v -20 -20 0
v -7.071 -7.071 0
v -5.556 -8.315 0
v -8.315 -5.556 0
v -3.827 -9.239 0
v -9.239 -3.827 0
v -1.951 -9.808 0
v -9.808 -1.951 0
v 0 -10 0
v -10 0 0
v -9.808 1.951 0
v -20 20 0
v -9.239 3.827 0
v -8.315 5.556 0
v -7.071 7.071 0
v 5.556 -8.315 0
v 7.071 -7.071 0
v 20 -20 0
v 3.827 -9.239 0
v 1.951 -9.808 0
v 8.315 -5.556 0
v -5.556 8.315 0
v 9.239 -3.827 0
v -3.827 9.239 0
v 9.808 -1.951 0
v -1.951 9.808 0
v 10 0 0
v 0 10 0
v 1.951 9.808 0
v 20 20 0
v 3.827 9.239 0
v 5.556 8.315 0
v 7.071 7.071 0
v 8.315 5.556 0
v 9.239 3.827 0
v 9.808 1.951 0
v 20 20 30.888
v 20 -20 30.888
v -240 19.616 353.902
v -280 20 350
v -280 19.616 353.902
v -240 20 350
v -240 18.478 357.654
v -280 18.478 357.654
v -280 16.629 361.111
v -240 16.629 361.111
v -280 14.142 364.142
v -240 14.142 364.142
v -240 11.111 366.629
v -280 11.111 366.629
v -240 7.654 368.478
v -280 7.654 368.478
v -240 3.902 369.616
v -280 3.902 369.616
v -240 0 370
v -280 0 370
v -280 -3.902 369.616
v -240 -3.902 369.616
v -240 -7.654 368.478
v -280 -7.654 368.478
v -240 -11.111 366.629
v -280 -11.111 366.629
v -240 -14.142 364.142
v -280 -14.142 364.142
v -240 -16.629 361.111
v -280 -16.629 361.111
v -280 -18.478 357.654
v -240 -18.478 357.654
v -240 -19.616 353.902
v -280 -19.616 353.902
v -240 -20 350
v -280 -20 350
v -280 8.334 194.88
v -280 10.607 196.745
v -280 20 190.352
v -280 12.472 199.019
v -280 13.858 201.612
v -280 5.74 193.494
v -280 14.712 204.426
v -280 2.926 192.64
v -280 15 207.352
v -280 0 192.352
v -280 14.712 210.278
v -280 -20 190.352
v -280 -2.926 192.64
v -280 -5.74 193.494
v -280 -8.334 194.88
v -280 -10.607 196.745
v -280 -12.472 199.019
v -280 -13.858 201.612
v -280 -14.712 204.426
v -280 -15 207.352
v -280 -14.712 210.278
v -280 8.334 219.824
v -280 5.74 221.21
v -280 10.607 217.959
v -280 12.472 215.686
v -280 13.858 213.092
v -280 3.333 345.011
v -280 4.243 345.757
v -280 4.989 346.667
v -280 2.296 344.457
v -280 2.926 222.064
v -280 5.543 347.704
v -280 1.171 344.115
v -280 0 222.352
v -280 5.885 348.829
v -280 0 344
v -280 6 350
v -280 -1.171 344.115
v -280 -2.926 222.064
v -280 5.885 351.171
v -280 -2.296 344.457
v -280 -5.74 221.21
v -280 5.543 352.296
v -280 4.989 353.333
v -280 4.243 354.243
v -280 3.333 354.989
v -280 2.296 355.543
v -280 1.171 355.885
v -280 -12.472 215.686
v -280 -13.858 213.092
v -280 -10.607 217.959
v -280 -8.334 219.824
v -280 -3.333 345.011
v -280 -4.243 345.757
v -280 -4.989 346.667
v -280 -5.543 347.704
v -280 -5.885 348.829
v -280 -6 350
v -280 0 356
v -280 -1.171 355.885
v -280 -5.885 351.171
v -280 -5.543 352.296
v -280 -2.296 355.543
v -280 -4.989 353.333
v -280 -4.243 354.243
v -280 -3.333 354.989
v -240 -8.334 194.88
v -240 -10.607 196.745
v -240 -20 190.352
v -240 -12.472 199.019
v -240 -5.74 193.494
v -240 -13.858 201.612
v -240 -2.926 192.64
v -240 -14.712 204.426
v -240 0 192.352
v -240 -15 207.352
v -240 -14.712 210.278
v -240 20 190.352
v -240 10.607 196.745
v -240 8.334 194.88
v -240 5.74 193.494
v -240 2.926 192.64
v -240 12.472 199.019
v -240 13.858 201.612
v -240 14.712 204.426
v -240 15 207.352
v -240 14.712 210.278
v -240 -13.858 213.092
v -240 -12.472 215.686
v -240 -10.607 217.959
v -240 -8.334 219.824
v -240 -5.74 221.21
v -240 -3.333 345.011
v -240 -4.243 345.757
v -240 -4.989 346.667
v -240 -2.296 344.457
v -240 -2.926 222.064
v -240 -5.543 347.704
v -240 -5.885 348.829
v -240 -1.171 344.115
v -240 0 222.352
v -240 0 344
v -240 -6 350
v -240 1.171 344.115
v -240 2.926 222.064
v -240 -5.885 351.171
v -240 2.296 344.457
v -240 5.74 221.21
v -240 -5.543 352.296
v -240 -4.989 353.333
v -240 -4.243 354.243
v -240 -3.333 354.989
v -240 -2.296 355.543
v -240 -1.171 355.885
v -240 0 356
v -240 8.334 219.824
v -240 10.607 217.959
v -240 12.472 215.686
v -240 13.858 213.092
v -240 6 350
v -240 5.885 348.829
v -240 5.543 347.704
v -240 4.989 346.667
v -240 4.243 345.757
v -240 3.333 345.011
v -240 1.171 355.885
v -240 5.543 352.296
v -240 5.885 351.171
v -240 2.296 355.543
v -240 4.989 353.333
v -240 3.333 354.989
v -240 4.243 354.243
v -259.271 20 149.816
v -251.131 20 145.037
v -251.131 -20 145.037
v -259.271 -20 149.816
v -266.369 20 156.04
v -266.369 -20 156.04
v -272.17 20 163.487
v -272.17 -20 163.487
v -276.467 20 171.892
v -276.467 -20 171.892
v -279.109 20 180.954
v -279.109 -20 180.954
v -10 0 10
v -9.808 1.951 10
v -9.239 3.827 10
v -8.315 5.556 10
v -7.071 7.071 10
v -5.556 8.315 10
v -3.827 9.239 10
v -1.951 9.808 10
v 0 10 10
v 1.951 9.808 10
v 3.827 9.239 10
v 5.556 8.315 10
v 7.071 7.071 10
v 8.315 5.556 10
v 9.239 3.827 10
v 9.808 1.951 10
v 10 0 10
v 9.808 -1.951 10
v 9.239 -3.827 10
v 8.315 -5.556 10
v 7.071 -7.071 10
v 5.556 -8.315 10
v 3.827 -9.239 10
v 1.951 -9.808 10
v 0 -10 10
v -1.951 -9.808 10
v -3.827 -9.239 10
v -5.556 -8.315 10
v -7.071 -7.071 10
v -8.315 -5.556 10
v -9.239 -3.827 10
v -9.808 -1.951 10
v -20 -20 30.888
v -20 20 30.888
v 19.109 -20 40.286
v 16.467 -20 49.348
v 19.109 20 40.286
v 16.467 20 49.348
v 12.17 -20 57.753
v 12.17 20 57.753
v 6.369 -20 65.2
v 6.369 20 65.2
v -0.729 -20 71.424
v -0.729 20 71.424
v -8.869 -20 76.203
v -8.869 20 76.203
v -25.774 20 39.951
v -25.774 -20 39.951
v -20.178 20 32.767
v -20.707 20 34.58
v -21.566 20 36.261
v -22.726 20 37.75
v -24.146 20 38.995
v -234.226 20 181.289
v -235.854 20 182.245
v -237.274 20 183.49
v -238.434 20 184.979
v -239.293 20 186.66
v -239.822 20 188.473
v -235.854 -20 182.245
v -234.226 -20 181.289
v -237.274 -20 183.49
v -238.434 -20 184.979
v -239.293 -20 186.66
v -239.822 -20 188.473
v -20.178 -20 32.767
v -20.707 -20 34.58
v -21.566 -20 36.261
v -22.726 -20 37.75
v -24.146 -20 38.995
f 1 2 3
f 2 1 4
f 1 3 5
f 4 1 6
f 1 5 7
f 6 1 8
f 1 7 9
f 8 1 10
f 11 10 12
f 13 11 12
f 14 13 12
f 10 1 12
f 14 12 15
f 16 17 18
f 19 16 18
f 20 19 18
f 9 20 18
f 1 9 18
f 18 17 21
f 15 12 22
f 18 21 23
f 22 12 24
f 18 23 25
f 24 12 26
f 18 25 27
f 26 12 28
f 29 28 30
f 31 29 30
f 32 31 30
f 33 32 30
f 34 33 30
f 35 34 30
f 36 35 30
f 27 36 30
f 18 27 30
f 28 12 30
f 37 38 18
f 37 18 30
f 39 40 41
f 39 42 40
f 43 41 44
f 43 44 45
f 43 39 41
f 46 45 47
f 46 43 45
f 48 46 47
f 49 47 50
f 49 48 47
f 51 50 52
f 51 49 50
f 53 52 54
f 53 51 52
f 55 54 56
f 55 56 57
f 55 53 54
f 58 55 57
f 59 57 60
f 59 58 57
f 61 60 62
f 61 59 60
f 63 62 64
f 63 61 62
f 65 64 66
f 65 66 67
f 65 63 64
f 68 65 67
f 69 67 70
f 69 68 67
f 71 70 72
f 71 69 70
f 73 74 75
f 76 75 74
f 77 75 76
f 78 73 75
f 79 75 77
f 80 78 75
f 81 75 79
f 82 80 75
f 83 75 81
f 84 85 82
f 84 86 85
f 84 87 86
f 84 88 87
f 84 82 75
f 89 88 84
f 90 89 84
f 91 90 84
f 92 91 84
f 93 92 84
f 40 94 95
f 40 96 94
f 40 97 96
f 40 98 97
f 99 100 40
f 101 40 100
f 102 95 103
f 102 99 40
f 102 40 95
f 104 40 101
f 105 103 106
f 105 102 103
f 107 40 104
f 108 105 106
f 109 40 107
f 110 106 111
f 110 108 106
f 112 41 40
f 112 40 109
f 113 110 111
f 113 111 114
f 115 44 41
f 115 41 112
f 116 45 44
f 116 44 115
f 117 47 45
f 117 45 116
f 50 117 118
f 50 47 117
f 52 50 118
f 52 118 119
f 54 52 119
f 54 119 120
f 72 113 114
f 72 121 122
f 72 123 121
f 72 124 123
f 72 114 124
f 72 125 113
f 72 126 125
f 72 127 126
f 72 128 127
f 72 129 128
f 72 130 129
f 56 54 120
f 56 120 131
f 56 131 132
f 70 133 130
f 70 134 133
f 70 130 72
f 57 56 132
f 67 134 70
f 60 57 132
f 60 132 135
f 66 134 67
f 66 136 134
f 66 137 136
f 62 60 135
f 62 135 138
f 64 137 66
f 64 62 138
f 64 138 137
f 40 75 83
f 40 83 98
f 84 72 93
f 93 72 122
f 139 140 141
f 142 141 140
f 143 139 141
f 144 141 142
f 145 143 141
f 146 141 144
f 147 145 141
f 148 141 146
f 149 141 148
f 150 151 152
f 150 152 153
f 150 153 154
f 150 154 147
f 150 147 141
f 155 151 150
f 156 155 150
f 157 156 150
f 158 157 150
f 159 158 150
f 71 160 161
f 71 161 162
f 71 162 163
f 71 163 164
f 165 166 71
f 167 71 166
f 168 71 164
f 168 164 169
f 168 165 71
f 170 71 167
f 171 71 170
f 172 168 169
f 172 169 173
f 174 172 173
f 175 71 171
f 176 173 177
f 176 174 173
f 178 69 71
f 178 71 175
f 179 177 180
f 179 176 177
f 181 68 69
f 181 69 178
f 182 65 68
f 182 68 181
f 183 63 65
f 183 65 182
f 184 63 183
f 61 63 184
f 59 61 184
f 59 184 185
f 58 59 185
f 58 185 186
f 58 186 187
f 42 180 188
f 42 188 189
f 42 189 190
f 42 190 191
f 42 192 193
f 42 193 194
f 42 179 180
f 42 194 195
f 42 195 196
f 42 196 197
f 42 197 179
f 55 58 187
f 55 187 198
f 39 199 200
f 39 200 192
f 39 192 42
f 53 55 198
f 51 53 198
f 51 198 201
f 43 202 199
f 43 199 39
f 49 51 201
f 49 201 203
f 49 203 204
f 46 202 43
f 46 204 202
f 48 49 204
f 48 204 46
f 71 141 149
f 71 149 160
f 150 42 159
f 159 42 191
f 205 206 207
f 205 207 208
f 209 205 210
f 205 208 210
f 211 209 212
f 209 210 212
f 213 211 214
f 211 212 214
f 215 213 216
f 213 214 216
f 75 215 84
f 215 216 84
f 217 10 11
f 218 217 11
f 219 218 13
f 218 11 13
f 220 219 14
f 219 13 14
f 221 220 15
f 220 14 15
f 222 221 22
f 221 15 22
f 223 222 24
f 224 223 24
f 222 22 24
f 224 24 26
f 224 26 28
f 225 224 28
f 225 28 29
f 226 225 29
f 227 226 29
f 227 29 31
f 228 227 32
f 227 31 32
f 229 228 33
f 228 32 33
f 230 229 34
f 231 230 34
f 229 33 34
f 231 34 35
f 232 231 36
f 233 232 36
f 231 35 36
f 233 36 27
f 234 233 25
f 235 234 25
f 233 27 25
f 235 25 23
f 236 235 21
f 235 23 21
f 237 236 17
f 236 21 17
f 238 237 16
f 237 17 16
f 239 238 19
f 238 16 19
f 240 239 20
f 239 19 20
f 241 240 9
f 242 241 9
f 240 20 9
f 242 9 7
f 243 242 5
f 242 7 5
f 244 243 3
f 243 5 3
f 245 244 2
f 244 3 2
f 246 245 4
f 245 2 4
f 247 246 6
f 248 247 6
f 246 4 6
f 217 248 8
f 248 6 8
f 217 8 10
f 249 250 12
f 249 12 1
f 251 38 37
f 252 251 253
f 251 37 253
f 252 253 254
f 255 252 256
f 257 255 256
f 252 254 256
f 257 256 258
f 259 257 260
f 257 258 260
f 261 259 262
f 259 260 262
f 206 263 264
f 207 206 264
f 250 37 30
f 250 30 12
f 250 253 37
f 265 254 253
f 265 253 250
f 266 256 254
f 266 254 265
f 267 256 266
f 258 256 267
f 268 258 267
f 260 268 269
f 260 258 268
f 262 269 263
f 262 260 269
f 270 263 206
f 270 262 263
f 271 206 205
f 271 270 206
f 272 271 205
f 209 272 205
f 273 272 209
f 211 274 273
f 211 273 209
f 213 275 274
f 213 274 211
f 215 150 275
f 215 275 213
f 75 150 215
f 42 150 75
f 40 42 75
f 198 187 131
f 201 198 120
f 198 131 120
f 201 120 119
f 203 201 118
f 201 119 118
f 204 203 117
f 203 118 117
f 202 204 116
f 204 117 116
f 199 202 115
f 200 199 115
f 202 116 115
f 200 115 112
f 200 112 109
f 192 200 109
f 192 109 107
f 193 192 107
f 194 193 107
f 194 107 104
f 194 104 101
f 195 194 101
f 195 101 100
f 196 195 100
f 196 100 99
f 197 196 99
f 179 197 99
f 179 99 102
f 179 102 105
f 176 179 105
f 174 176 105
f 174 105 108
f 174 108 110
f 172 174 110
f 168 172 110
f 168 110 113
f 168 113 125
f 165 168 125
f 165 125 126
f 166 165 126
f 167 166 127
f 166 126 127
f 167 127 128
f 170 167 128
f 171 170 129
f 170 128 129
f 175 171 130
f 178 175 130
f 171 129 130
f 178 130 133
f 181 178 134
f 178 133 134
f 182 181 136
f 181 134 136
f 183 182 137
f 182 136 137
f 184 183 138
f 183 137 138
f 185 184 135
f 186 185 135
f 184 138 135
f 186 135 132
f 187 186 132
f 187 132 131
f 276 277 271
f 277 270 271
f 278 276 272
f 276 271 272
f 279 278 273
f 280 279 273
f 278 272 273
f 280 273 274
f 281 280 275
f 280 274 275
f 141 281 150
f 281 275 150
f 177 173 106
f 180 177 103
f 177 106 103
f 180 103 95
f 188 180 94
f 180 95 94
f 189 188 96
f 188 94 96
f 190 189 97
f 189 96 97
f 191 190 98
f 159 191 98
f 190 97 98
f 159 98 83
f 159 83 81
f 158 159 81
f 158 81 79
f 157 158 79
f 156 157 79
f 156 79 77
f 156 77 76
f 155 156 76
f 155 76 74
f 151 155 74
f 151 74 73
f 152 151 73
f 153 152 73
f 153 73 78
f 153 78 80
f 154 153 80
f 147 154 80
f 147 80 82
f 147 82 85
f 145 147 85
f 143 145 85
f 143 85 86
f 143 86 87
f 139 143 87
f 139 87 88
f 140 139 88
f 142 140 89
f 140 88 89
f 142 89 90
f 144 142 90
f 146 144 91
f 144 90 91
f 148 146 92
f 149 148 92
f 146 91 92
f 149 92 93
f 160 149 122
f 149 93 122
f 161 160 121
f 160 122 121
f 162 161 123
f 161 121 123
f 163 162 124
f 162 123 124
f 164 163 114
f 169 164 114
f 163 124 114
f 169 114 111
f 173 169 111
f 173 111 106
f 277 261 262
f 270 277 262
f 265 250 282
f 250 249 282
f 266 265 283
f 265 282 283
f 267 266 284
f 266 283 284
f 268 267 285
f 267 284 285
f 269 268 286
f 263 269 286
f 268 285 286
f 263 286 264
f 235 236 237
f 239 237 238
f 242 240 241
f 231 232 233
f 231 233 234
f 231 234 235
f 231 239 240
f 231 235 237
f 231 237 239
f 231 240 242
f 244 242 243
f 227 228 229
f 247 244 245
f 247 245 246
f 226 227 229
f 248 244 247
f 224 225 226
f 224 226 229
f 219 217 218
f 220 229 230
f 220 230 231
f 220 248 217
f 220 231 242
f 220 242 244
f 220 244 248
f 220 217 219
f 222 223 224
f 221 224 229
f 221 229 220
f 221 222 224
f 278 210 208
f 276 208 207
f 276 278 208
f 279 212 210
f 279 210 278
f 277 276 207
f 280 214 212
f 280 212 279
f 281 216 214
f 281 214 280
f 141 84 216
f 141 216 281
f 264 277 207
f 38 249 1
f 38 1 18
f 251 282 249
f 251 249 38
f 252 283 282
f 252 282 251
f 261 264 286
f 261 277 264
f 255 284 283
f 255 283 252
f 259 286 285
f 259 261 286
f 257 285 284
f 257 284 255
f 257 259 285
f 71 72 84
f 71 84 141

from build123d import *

# Parameters (mm, degrees)
SKETCH_2_W          = 40
SKETCH_2_H          = 40
FILLET_1_RADIUS     = 20
FILLET_1_LENGTH     = 40
SKETCH_3_R          = 6
CUT_EXTRUDE_1_DEPTH = 477.759897642
SKETCH_4_R          = 10
CUT_EXTRUDE_2_DEPTH = 10
SKETCH_5_R          = 15
CUT_EXTRUDE_3_DEPTH = 477.759897642


with BuildPart() as part:
    # 扫描1: sweep along a path in 草图1
    with BuildLine(Plane(origin=(0, 0, 0), x_dir=(1, 0, 0), z_dir=(0, 1, 0))) as sweep_1_path:
        Line((0, 0), (0, -30.887892176))
        ThreePointArc((0, -30.887892176), (-4.698256626, -47.006880426), (-17.321452148, -58.077125787))
        Line((-17.321452148, -58.077125787), (-242.678547852, -163.162865333))
        ThreePointArc((-242.678547852, -163.162865333), (-255.301743374, -174.233110694), (-260, -190.352098945))
        Line((-260, -190.352098945), (-260, -370))
    # 草图2 → 扫描1 (sweep)
    with BuildSketch(Plane.XY):
        Rectangle(SKETCH_2_W, SKETCH_2_H)
    sweep(path=sweep_1_path.line)

    # 圆角1: full round fillet: the end face becomes a half cylinder, R = half its width
    fillet_1_face = Plane((-260, 0, 370), x_dir=(1, 0, 0), z_dir=(0, 0, 1))  # on the end face: x along it, z out of the body
    fillet_1_slab = fillet_1_face.offset(-FILLET_1_RADIUS / 2) * Box(FILLET_1_LENGTH, 2 * FILLET_1_RADIUS, FILLET_1_RADIUS, mode=Mode.PRIVATE)  # the body's end, R deep
    fillet_1_round = Plane((-260, 0, 350), x_dir=(0, 0, 1), z_dir=(1, 0, 0)) * Cylinder(FILLET_1_RADIUS, FILLET_1_LENGTH, mode=Mode.PRIVATE)  # its axis R under the face
    add(fillet_1_slab - fillet_1_round, mode=Mode.SUBTRACT)

    # 草图3 → 切除-拉伸1 (cut, through all)
    with BuildSketch(Plane.ZY.offset(280)):
        with Locations((350, 0)):
            Circle(SKETCH_3_R)
    extrude(amount=-CUT_EXTRUDE_1_DEPTH, mode=Mode.SUBTRACT)

    # 草图4 → 切除-拉伸2 (cut)
    with BuildSketch(Plane(origin=(0, 0, 0), x_dir=(-1, 0, 0), z_dir=(0, 0, -1))):
        Circle(SKETCH_4_R)
    extrude(amount=-CUT_EXTRUDE_2_DEPTH, mode=Mode.SUBTRACT)

    # 草图5 → 切除-拉伸3 (cut, through all)
    with BuildSketch(Plane.ZY.offset(280)):
        with Locations((207.352098945, 0)):
            Circle(SKETCH_5_R)
    extrude(amount=-CUT_EXTRUDE_3_DEPTH, mode=Mode.SUBTRACT)


solid = part.part
